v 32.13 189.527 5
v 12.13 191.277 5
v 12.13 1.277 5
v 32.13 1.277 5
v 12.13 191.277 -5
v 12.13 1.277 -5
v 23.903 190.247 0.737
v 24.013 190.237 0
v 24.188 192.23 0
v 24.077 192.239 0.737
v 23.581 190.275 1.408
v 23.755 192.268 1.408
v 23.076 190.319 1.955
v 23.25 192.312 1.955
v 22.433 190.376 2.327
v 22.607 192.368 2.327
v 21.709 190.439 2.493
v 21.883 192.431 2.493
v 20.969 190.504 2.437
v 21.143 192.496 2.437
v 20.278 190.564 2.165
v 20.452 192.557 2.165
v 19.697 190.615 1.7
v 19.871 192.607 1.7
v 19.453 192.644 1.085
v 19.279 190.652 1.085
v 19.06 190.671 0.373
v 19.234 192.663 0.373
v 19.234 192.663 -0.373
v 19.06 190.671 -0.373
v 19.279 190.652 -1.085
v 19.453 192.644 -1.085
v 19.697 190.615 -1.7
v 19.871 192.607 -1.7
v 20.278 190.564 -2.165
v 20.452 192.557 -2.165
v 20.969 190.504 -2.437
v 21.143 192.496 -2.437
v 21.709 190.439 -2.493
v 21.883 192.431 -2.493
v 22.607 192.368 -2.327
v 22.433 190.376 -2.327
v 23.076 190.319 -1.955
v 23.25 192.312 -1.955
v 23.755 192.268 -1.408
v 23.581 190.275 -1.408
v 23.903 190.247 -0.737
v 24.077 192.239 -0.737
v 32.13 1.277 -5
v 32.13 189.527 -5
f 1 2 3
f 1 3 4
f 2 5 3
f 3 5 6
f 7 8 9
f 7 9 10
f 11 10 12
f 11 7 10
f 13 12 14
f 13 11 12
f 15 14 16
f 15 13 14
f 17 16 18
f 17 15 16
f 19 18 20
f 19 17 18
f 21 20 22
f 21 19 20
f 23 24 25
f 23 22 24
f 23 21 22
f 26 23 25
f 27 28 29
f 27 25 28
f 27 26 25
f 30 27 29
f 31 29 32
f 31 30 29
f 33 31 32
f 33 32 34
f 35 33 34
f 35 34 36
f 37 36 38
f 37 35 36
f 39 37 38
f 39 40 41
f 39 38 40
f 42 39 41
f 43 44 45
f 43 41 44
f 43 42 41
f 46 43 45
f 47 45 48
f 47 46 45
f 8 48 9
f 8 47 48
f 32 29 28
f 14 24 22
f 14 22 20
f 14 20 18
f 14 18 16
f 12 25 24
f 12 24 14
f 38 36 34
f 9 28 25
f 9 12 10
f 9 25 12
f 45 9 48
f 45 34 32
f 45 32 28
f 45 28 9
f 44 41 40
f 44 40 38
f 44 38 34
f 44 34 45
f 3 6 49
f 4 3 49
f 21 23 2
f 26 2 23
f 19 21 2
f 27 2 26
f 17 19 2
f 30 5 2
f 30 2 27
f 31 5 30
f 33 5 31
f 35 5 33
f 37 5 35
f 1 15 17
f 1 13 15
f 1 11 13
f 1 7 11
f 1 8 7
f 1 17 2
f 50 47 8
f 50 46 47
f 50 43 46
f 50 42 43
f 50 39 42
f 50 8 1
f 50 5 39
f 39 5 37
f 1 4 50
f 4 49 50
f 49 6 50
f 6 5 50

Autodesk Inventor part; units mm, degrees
ref_plane "YZ Plane" through (0, 0, 0) normal (1, 0, 0) x (0, 1, 0)
ref_plane "XZ Plane" through (0, 0, 0) normal (0, 1, 0) x (-1, 0, 0)
ref_plane "XY Plane" through (0, 0, 0) normal (0, 0, 1) x (1, 0, 0)
sketch "Sketch1" plane through (0, 0, 0) normal (0, 0, 1) x (1, 0, 0)
  line L0 (12.1296, 191.2771) -> (12.1296, 1.2771)
  line L1 (12.1296, 1.2771) -> (32.1296, 1.2771)
  line L2 (12.1296, 191.2771) -> (32.1296, 189.5273)
  line L3 (12.1296, 191.2771) -> (39.6219, 191.2771) construction
  line L4 (32.1296, 1.2771) -> (32.1296, 189.5273)
  point P0 (0, 0)
  dimension "d0" = 190
  dimension "d1" = 20
  dimension "d2" = 5
extrude "Extrusion1" add sketch "Sketch1" along normal mid plane 10
sketch "Sketch2" plane through (12.1296, 191.2771, 5) normal (0.0871557, 0.9961947, 0) x (0.9961947, -0.0871557, 0)
  circle A0 centre (9.4291, 5) radius 2.5
  point P0 (4.5875, 5)
  dimension "d7" = 5
extrude "Extrusion2" add sketch "Sketch2" along normal blind 2
properties part number "stand2"
